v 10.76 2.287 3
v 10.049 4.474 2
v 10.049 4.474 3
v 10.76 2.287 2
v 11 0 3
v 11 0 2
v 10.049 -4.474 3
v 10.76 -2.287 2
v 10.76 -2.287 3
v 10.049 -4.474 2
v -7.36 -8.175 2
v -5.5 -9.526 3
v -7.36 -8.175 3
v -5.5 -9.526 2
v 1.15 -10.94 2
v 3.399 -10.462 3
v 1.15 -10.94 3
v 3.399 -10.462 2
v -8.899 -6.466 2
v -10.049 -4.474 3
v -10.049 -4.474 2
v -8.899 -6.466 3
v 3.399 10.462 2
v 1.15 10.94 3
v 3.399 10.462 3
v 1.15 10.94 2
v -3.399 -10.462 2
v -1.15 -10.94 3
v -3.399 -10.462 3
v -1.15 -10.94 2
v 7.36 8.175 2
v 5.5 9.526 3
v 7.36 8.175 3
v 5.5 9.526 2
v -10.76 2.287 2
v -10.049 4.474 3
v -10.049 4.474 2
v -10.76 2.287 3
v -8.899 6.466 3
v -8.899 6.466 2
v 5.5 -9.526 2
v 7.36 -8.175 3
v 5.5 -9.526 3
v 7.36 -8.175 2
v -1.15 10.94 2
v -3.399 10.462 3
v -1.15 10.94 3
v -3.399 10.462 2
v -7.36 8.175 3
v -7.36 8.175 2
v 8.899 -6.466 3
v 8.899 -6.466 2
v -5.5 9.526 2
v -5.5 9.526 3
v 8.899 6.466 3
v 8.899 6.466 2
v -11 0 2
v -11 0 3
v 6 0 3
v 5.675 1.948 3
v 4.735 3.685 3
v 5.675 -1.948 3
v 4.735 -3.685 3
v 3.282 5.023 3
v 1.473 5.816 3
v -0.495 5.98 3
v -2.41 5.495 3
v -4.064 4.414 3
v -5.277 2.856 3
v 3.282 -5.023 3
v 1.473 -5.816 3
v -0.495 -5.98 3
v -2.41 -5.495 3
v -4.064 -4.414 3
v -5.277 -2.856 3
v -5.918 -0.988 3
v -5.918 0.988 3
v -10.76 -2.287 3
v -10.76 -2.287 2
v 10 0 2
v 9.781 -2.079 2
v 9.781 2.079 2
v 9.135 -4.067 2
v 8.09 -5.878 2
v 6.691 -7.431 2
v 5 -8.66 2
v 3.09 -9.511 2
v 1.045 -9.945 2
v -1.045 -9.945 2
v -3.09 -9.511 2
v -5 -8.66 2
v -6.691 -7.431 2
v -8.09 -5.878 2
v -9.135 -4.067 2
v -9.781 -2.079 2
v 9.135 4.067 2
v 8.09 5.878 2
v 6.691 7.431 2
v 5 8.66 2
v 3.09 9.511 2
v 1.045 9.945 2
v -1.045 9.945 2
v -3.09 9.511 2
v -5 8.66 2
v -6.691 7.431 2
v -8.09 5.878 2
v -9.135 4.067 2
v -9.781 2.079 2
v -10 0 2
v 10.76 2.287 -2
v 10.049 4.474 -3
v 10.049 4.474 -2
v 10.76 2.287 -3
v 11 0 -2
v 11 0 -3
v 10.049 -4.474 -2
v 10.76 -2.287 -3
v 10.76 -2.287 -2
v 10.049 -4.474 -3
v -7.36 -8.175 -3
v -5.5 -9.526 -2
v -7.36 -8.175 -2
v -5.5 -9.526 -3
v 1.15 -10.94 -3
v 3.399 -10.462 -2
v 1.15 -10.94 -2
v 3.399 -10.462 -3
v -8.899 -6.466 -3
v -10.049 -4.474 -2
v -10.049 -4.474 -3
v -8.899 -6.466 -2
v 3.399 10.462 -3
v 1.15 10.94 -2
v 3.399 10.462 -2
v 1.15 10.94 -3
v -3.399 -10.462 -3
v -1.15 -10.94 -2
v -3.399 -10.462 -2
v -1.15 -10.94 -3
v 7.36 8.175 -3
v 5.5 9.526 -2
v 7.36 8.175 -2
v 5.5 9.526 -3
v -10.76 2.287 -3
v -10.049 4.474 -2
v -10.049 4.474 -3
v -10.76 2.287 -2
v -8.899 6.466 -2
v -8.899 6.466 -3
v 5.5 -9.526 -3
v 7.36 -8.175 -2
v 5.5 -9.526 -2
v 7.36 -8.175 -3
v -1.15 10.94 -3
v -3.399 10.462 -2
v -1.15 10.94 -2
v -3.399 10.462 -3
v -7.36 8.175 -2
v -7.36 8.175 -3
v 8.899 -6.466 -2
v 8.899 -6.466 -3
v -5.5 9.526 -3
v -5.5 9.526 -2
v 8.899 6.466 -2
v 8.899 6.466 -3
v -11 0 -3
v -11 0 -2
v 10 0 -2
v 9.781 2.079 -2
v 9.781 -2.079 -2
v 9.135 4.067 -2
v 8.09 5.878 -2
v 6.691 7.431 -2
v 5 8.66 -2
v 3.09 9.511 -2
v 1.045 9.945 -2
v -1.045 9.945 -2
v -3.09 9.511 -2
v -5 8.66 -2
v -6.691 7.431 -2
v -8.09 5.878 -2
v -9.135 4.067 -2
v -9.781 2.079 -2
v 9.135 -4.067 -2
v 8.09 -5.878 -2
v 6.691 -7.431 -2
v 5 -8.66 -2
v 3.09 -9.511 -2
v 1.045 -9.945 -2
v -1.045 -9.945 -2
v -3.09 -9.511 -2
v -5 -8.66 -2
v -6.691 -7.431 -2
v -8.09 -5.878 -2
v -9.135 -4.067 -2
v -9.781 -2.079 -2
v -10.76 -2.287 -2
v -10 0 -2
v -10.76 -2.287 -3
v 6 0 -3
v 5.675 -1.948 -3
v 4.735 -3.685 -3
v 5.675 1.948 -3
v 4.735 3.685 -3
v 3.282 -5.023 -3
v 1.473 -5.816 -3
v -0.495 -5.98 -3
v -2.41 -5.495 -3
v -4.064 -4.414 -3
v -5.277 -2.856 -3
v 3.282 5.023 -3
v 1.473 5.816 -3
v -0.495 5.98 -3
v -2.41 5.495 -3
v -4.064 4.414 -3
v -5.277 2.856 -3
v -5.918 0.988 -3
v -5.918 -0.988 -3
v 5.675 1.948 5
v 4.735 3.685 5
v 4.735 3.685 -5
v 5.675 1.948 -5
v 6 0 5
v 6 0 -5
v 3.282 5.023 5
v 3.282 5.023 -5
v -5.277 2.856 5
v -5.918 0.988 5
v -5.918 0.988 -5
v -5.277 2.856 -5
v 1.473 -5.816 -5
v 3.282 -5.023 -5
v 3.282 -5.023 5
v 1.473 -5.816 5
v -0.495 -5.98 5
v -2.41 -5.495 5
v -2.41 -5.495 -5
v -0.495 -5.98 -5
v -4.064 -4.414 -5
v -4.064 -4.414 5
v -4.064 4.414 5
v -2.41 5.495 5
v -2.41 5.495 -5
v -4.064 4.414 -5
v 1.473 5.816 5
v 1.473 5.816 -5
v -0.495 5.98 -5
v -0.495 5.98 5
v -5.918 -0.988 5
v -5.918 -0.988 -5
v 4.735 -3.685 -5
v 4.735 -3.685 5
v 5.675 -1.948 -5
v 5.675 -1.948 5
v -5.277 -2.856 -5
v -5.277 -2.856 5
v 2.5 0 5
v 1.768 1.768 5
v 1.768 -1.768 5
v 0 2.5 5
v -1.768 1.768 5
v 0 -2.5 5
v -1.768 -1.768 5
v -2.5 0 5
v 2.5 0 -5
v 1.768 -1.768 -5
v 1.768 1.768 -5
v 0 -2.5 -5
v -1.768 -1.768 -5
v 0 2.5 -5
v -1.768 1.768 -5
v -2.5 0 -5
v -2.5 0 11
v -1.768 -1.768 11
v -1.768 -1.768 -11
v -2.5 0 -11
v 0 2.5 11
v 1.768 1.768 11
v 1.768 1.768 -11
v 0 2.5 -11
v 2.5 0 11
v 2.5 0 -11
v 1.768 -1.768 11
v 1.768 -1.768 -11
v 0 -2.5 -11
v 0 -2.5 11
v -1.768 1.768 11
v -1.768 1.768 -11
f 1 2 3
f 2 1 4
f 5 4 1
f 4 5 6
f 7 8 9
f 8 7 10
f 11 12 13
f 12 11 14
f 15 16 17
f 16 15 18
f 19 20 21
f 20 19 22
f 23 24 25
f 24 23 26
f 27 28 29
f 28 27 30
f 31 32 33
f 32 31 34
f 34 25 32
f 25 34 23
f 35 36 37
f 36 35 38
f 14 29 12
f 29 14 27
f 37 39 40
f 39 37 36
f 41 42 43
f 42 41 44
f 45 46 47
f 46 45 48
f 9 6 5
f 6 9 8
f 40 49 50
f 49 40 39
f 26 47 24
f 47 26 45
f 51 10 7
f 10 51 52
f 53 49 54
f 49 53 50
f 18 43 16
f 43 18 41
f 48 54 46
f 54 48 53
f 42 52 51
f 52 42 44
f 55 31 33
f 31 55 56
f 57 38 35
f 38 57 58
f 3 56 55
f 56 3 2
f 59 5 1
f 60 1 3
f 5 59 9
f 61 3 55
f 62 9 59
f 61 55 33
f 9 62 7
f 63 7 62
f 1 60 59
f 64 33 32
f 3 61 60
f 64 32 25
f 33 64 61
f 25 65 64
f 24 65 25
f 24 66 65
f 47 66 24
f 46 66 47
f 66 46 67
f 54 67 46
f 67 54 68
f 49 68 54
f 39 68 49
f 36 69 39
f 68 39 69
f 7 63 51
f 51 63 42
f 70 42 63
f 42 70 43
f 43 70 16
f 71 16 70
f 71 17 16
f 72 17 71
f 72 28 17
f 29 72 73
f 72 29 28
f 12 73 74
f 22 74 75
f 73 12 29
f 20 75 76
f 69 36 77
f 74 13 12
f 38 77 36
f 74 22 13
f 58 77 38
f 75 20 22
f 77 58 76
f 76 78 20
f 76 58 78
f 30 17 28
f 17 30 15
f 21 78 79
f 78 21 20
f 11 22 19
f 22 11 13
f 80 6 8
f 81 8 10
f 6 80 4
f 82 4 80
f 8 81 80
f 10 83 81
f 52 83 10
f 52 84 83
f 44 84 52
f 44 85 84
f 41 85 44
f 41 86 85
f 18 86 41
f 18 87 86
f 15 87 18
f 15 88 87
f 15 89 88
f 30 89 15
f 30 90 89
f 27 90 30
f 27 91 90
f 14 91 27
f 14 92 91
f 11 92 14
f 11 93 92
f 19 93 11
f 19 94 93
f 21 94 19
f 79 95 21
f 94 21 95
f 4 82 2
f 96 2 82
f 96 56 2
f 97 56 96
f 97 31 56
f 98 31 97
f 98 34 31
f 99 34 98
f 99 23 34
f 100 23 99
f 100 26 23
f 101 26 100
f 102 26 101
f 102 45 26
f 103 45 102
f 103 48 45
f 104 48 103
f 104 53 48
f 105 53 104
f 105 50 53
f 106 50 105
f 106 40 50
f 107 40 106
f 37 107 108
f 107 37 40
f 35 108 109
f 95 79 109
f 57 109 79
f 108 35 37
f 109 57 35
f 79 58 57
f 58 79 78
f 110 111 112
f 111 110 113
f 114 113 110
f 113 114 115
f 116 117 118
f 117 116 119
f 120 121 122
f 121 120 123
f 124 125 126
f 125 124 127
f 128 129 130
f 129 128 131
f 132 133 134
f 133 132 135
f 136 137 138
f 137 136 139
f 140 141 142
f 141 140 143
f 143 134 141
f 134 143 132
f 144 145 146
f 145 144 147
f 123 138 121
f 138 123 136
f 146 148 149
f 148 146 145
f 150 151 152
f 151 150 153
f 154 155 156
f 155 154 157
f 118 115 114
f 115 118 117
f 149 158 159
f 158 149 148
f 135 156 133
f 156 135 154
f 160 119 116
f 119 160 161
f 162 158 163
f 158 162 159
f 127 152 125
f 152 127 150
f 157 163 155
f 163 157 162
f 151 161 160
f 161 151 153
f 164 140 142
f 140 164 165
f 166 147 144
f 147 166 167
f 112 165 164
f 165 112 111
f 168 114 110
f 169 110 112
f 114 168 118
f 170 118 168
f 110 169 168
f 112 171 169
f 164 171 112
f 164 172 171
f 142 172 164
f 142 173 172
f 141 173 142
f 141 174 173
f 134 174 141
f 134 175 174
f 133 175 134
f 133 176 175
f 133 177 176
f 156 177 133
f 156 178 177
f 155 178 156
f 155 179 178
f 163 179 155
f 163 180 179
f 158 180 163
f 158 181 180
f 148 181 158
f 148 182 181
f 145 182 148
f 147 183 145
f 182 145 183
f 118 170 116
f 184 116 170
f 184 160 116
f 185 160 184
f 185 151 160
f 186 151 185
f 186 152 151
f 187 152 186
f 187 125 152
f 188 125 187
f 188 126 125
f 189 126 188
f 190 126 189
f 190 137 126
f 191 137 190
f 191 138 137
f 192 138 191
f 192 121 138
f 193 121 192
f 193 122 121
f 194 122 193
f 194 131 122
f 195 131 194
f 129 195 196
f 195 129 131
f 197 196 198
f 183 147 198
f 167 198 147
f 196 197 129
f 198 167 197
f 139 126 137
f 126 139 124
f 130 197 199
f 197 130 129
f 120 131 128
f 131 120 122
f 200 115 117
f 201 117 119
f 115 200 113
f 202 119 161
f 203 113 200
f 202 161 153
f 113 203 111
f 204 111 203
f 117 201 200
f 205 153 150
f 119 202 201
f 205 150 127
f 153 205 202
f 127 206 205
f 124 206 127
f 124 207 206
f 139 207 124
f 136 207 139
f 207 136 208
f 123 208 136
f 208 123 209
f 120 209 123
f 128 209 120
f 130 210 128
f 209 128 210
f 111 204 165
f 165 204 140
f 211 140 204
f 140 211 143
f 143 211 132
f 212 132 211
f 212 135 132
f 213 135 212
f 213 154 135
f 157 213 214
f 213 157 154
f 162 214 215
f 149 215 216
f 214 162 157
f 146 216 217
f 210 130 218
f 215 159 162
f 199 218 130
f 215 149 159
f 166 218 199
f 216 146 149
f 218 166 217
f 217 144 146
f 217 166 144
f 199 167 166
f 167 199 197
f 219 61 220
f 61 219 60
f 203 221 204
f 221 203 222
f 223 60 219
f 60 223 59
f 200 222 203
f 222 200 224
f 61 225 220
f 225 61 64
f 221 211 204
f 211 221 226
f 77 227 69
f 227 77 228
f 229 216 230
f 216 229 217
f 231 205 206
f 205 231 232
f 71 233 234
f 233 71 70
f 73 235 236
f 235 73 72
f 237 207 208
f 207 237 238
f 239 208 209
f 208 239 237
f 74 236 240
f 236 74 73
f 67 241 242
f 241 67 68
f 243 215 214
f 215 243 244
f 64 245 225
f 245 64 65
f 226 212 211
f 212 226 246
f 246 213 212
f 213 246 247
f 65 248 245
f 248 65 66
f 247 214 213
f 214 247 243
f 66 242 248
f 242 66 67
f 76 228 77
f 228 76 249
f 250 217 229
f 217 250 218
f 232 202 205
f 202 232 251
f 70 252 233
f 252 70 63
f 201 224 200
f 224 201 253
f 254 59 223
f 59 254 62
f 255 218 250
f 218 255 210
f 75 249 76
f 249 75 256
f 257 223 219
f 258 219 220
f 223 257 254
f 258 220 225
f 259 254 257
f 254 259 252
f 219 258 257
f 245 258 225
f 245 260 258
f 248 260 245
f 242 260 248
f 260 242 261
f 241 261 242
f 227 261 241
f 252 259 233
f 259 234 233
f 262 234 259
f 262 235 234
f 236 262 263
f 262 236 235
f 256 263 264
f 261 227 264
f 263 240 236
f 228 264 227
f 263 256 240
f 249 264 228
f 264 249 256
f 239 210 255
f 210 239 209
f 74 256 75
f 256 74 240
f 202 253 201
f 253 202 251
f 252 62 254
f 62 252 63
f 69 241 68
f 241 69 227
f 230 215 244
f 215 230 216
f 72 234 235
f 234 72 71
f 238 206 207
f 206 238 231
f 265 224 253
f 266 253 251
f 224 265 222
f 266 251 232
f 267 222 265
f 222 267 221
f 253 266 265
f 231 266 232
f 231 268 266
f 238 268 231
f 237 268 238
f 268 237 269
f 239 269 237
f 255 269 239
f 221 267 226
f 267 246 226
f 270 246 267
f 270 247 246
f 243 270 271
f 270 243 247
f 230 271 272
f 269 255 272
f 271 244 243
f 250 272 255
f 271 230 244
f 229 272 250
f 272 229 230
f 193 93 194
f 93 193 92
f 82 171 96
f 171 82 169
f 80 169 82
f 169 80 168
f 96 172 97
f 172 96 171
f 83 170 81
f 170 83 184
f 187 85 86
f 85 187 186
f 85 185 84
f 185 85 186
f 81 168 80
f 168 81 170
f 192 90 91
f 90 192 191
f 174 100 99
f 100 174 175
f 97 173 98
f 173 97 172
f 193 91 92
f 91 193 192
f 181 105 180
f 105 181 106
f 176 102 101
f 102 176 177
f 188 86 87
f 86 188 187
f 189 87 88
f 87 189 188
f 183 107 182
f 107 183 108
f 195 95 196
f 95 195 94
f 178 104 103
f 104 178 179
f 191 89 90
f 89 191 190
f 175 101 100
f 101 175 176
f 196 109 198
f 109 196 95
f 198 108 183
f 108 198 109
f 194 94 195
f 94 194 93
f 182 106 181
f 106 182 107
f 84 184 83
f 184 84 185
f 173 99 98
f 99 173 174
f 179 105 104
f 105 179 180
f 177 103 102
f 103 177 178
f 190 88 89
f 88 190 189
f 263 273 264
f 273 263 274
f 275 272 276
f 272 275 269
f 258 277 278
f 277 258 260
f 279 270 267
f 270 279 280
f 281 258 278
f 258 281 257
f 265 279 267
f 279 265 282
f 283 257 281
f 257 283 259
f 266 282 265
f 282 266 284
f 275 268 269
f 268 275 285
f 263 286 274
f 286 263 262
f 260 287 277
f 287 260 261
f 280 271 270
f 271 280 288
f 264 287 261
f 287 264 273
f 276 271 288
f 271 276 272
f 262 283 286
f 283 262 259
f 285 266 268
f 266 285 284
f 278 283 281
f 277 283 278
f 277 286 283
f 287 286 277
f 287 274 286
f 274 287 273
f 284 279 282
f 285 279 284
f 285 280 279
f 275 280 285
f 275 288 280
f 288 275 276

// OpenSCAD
// Parameters
pulley_type = 0; //[0:1:1]
teeth_count = 20; //[10:60:1]
outer_diameter_mm = 20; //[10:40:1]
belt_pitch_mm = 2; //[1:5:0.1]
width_mm = 6; //[3:20:1]
bore_diameter_mm = 5; //[2:12:0.5]
hub_diameter_mm = 12; //[6:24:1]
hub_length_mm = 10; //[5:25:1]
flange_diameter_mm = 22; //[12:44:1]
flange_thickness_mm = 1; //[0.5:4:0.5]
set_screw_count = 0; //[0:2:1]
set_screw_diameter_mm = 3; //[2:6:0.5]
set_screw_z_offset_mm = 0; //[-5:5:0.5]
overlap_mm = 1; //[0.5:2:0.5]
tooth_radial_height_mm = 1; //[0.5:3:0.5]
tooth_width_factor = 0.6; //[0.3:0.9:0.05]

// Pulley module
module pulley() {
  color("Silver") {
    // Hub
    translate([0, 0, 0])
      cylinder(r=hub_diameter_mm/2, h=hub_length_mm, center=true);

    // Pulley body
    translate([0, 0, 0])
      cylinder(r=outer_diameter_mm/2, h=width_mm, center=true);

    // Flanges
    if (flange_diameter_mm > 0) {
      translate([0, 0, width_mm/2 + flange_thickness_mm/2 - overlap_mm])
        cylinder(r=flange_diameter_mm/2, h=flange_thickness_mm, center=true);
      translate([0, 0, -width_mm/2 - flange_thickness_mm/2 + overlap_mm])
        cylinder(r=flange_diameter_mm/2, h=flange_thickness_mm, center=true);
    }

    // Teeth (if timing pulley)
    if (pulley_type == 1) {
      for (i = [0:teeth_count-1]) {
        rotate([0, 0, i*360/teeth_count])
          translate([outer_diameter_mm/2 - tooth_radial_height_mm/2, 0, 0])
            cube([tooth_radial_height_mm + overlap_mm, belt_pitch_mm*tooth_width_factor, width_mm], center=true);
      }
    }

    // Shaft bore
    translate([0, 0, 0])
      cylinder(r=bore_diameter_mm/2, h=hub_length_mm + width_mm + 2*flange_thickness_mm + 4*overlap_mm, center=true);

    // Set screw holes
    if (set_screw_count > 0) {
      rotate([0, 90, 0])
        translate([0, 0, set_screw_z_offset_mm])
          cylinder(r=set_screw_diameter_mm/2, h=hub_diameter_mm + 2*overlap_mm, center=true);
    }
    if (set_screw_count > 1) {
      rotate([90, 0, 0])
        translate([0, 0, set_screw_z_offset_mm])
          cylinder(r=set_screw_diameter_mm/2, h=hub_diameter_mm + 2*overlap_mm, center=true);
    }
  }
}

// Assembly
module assembly() {
  pulley();
}

assembly();
